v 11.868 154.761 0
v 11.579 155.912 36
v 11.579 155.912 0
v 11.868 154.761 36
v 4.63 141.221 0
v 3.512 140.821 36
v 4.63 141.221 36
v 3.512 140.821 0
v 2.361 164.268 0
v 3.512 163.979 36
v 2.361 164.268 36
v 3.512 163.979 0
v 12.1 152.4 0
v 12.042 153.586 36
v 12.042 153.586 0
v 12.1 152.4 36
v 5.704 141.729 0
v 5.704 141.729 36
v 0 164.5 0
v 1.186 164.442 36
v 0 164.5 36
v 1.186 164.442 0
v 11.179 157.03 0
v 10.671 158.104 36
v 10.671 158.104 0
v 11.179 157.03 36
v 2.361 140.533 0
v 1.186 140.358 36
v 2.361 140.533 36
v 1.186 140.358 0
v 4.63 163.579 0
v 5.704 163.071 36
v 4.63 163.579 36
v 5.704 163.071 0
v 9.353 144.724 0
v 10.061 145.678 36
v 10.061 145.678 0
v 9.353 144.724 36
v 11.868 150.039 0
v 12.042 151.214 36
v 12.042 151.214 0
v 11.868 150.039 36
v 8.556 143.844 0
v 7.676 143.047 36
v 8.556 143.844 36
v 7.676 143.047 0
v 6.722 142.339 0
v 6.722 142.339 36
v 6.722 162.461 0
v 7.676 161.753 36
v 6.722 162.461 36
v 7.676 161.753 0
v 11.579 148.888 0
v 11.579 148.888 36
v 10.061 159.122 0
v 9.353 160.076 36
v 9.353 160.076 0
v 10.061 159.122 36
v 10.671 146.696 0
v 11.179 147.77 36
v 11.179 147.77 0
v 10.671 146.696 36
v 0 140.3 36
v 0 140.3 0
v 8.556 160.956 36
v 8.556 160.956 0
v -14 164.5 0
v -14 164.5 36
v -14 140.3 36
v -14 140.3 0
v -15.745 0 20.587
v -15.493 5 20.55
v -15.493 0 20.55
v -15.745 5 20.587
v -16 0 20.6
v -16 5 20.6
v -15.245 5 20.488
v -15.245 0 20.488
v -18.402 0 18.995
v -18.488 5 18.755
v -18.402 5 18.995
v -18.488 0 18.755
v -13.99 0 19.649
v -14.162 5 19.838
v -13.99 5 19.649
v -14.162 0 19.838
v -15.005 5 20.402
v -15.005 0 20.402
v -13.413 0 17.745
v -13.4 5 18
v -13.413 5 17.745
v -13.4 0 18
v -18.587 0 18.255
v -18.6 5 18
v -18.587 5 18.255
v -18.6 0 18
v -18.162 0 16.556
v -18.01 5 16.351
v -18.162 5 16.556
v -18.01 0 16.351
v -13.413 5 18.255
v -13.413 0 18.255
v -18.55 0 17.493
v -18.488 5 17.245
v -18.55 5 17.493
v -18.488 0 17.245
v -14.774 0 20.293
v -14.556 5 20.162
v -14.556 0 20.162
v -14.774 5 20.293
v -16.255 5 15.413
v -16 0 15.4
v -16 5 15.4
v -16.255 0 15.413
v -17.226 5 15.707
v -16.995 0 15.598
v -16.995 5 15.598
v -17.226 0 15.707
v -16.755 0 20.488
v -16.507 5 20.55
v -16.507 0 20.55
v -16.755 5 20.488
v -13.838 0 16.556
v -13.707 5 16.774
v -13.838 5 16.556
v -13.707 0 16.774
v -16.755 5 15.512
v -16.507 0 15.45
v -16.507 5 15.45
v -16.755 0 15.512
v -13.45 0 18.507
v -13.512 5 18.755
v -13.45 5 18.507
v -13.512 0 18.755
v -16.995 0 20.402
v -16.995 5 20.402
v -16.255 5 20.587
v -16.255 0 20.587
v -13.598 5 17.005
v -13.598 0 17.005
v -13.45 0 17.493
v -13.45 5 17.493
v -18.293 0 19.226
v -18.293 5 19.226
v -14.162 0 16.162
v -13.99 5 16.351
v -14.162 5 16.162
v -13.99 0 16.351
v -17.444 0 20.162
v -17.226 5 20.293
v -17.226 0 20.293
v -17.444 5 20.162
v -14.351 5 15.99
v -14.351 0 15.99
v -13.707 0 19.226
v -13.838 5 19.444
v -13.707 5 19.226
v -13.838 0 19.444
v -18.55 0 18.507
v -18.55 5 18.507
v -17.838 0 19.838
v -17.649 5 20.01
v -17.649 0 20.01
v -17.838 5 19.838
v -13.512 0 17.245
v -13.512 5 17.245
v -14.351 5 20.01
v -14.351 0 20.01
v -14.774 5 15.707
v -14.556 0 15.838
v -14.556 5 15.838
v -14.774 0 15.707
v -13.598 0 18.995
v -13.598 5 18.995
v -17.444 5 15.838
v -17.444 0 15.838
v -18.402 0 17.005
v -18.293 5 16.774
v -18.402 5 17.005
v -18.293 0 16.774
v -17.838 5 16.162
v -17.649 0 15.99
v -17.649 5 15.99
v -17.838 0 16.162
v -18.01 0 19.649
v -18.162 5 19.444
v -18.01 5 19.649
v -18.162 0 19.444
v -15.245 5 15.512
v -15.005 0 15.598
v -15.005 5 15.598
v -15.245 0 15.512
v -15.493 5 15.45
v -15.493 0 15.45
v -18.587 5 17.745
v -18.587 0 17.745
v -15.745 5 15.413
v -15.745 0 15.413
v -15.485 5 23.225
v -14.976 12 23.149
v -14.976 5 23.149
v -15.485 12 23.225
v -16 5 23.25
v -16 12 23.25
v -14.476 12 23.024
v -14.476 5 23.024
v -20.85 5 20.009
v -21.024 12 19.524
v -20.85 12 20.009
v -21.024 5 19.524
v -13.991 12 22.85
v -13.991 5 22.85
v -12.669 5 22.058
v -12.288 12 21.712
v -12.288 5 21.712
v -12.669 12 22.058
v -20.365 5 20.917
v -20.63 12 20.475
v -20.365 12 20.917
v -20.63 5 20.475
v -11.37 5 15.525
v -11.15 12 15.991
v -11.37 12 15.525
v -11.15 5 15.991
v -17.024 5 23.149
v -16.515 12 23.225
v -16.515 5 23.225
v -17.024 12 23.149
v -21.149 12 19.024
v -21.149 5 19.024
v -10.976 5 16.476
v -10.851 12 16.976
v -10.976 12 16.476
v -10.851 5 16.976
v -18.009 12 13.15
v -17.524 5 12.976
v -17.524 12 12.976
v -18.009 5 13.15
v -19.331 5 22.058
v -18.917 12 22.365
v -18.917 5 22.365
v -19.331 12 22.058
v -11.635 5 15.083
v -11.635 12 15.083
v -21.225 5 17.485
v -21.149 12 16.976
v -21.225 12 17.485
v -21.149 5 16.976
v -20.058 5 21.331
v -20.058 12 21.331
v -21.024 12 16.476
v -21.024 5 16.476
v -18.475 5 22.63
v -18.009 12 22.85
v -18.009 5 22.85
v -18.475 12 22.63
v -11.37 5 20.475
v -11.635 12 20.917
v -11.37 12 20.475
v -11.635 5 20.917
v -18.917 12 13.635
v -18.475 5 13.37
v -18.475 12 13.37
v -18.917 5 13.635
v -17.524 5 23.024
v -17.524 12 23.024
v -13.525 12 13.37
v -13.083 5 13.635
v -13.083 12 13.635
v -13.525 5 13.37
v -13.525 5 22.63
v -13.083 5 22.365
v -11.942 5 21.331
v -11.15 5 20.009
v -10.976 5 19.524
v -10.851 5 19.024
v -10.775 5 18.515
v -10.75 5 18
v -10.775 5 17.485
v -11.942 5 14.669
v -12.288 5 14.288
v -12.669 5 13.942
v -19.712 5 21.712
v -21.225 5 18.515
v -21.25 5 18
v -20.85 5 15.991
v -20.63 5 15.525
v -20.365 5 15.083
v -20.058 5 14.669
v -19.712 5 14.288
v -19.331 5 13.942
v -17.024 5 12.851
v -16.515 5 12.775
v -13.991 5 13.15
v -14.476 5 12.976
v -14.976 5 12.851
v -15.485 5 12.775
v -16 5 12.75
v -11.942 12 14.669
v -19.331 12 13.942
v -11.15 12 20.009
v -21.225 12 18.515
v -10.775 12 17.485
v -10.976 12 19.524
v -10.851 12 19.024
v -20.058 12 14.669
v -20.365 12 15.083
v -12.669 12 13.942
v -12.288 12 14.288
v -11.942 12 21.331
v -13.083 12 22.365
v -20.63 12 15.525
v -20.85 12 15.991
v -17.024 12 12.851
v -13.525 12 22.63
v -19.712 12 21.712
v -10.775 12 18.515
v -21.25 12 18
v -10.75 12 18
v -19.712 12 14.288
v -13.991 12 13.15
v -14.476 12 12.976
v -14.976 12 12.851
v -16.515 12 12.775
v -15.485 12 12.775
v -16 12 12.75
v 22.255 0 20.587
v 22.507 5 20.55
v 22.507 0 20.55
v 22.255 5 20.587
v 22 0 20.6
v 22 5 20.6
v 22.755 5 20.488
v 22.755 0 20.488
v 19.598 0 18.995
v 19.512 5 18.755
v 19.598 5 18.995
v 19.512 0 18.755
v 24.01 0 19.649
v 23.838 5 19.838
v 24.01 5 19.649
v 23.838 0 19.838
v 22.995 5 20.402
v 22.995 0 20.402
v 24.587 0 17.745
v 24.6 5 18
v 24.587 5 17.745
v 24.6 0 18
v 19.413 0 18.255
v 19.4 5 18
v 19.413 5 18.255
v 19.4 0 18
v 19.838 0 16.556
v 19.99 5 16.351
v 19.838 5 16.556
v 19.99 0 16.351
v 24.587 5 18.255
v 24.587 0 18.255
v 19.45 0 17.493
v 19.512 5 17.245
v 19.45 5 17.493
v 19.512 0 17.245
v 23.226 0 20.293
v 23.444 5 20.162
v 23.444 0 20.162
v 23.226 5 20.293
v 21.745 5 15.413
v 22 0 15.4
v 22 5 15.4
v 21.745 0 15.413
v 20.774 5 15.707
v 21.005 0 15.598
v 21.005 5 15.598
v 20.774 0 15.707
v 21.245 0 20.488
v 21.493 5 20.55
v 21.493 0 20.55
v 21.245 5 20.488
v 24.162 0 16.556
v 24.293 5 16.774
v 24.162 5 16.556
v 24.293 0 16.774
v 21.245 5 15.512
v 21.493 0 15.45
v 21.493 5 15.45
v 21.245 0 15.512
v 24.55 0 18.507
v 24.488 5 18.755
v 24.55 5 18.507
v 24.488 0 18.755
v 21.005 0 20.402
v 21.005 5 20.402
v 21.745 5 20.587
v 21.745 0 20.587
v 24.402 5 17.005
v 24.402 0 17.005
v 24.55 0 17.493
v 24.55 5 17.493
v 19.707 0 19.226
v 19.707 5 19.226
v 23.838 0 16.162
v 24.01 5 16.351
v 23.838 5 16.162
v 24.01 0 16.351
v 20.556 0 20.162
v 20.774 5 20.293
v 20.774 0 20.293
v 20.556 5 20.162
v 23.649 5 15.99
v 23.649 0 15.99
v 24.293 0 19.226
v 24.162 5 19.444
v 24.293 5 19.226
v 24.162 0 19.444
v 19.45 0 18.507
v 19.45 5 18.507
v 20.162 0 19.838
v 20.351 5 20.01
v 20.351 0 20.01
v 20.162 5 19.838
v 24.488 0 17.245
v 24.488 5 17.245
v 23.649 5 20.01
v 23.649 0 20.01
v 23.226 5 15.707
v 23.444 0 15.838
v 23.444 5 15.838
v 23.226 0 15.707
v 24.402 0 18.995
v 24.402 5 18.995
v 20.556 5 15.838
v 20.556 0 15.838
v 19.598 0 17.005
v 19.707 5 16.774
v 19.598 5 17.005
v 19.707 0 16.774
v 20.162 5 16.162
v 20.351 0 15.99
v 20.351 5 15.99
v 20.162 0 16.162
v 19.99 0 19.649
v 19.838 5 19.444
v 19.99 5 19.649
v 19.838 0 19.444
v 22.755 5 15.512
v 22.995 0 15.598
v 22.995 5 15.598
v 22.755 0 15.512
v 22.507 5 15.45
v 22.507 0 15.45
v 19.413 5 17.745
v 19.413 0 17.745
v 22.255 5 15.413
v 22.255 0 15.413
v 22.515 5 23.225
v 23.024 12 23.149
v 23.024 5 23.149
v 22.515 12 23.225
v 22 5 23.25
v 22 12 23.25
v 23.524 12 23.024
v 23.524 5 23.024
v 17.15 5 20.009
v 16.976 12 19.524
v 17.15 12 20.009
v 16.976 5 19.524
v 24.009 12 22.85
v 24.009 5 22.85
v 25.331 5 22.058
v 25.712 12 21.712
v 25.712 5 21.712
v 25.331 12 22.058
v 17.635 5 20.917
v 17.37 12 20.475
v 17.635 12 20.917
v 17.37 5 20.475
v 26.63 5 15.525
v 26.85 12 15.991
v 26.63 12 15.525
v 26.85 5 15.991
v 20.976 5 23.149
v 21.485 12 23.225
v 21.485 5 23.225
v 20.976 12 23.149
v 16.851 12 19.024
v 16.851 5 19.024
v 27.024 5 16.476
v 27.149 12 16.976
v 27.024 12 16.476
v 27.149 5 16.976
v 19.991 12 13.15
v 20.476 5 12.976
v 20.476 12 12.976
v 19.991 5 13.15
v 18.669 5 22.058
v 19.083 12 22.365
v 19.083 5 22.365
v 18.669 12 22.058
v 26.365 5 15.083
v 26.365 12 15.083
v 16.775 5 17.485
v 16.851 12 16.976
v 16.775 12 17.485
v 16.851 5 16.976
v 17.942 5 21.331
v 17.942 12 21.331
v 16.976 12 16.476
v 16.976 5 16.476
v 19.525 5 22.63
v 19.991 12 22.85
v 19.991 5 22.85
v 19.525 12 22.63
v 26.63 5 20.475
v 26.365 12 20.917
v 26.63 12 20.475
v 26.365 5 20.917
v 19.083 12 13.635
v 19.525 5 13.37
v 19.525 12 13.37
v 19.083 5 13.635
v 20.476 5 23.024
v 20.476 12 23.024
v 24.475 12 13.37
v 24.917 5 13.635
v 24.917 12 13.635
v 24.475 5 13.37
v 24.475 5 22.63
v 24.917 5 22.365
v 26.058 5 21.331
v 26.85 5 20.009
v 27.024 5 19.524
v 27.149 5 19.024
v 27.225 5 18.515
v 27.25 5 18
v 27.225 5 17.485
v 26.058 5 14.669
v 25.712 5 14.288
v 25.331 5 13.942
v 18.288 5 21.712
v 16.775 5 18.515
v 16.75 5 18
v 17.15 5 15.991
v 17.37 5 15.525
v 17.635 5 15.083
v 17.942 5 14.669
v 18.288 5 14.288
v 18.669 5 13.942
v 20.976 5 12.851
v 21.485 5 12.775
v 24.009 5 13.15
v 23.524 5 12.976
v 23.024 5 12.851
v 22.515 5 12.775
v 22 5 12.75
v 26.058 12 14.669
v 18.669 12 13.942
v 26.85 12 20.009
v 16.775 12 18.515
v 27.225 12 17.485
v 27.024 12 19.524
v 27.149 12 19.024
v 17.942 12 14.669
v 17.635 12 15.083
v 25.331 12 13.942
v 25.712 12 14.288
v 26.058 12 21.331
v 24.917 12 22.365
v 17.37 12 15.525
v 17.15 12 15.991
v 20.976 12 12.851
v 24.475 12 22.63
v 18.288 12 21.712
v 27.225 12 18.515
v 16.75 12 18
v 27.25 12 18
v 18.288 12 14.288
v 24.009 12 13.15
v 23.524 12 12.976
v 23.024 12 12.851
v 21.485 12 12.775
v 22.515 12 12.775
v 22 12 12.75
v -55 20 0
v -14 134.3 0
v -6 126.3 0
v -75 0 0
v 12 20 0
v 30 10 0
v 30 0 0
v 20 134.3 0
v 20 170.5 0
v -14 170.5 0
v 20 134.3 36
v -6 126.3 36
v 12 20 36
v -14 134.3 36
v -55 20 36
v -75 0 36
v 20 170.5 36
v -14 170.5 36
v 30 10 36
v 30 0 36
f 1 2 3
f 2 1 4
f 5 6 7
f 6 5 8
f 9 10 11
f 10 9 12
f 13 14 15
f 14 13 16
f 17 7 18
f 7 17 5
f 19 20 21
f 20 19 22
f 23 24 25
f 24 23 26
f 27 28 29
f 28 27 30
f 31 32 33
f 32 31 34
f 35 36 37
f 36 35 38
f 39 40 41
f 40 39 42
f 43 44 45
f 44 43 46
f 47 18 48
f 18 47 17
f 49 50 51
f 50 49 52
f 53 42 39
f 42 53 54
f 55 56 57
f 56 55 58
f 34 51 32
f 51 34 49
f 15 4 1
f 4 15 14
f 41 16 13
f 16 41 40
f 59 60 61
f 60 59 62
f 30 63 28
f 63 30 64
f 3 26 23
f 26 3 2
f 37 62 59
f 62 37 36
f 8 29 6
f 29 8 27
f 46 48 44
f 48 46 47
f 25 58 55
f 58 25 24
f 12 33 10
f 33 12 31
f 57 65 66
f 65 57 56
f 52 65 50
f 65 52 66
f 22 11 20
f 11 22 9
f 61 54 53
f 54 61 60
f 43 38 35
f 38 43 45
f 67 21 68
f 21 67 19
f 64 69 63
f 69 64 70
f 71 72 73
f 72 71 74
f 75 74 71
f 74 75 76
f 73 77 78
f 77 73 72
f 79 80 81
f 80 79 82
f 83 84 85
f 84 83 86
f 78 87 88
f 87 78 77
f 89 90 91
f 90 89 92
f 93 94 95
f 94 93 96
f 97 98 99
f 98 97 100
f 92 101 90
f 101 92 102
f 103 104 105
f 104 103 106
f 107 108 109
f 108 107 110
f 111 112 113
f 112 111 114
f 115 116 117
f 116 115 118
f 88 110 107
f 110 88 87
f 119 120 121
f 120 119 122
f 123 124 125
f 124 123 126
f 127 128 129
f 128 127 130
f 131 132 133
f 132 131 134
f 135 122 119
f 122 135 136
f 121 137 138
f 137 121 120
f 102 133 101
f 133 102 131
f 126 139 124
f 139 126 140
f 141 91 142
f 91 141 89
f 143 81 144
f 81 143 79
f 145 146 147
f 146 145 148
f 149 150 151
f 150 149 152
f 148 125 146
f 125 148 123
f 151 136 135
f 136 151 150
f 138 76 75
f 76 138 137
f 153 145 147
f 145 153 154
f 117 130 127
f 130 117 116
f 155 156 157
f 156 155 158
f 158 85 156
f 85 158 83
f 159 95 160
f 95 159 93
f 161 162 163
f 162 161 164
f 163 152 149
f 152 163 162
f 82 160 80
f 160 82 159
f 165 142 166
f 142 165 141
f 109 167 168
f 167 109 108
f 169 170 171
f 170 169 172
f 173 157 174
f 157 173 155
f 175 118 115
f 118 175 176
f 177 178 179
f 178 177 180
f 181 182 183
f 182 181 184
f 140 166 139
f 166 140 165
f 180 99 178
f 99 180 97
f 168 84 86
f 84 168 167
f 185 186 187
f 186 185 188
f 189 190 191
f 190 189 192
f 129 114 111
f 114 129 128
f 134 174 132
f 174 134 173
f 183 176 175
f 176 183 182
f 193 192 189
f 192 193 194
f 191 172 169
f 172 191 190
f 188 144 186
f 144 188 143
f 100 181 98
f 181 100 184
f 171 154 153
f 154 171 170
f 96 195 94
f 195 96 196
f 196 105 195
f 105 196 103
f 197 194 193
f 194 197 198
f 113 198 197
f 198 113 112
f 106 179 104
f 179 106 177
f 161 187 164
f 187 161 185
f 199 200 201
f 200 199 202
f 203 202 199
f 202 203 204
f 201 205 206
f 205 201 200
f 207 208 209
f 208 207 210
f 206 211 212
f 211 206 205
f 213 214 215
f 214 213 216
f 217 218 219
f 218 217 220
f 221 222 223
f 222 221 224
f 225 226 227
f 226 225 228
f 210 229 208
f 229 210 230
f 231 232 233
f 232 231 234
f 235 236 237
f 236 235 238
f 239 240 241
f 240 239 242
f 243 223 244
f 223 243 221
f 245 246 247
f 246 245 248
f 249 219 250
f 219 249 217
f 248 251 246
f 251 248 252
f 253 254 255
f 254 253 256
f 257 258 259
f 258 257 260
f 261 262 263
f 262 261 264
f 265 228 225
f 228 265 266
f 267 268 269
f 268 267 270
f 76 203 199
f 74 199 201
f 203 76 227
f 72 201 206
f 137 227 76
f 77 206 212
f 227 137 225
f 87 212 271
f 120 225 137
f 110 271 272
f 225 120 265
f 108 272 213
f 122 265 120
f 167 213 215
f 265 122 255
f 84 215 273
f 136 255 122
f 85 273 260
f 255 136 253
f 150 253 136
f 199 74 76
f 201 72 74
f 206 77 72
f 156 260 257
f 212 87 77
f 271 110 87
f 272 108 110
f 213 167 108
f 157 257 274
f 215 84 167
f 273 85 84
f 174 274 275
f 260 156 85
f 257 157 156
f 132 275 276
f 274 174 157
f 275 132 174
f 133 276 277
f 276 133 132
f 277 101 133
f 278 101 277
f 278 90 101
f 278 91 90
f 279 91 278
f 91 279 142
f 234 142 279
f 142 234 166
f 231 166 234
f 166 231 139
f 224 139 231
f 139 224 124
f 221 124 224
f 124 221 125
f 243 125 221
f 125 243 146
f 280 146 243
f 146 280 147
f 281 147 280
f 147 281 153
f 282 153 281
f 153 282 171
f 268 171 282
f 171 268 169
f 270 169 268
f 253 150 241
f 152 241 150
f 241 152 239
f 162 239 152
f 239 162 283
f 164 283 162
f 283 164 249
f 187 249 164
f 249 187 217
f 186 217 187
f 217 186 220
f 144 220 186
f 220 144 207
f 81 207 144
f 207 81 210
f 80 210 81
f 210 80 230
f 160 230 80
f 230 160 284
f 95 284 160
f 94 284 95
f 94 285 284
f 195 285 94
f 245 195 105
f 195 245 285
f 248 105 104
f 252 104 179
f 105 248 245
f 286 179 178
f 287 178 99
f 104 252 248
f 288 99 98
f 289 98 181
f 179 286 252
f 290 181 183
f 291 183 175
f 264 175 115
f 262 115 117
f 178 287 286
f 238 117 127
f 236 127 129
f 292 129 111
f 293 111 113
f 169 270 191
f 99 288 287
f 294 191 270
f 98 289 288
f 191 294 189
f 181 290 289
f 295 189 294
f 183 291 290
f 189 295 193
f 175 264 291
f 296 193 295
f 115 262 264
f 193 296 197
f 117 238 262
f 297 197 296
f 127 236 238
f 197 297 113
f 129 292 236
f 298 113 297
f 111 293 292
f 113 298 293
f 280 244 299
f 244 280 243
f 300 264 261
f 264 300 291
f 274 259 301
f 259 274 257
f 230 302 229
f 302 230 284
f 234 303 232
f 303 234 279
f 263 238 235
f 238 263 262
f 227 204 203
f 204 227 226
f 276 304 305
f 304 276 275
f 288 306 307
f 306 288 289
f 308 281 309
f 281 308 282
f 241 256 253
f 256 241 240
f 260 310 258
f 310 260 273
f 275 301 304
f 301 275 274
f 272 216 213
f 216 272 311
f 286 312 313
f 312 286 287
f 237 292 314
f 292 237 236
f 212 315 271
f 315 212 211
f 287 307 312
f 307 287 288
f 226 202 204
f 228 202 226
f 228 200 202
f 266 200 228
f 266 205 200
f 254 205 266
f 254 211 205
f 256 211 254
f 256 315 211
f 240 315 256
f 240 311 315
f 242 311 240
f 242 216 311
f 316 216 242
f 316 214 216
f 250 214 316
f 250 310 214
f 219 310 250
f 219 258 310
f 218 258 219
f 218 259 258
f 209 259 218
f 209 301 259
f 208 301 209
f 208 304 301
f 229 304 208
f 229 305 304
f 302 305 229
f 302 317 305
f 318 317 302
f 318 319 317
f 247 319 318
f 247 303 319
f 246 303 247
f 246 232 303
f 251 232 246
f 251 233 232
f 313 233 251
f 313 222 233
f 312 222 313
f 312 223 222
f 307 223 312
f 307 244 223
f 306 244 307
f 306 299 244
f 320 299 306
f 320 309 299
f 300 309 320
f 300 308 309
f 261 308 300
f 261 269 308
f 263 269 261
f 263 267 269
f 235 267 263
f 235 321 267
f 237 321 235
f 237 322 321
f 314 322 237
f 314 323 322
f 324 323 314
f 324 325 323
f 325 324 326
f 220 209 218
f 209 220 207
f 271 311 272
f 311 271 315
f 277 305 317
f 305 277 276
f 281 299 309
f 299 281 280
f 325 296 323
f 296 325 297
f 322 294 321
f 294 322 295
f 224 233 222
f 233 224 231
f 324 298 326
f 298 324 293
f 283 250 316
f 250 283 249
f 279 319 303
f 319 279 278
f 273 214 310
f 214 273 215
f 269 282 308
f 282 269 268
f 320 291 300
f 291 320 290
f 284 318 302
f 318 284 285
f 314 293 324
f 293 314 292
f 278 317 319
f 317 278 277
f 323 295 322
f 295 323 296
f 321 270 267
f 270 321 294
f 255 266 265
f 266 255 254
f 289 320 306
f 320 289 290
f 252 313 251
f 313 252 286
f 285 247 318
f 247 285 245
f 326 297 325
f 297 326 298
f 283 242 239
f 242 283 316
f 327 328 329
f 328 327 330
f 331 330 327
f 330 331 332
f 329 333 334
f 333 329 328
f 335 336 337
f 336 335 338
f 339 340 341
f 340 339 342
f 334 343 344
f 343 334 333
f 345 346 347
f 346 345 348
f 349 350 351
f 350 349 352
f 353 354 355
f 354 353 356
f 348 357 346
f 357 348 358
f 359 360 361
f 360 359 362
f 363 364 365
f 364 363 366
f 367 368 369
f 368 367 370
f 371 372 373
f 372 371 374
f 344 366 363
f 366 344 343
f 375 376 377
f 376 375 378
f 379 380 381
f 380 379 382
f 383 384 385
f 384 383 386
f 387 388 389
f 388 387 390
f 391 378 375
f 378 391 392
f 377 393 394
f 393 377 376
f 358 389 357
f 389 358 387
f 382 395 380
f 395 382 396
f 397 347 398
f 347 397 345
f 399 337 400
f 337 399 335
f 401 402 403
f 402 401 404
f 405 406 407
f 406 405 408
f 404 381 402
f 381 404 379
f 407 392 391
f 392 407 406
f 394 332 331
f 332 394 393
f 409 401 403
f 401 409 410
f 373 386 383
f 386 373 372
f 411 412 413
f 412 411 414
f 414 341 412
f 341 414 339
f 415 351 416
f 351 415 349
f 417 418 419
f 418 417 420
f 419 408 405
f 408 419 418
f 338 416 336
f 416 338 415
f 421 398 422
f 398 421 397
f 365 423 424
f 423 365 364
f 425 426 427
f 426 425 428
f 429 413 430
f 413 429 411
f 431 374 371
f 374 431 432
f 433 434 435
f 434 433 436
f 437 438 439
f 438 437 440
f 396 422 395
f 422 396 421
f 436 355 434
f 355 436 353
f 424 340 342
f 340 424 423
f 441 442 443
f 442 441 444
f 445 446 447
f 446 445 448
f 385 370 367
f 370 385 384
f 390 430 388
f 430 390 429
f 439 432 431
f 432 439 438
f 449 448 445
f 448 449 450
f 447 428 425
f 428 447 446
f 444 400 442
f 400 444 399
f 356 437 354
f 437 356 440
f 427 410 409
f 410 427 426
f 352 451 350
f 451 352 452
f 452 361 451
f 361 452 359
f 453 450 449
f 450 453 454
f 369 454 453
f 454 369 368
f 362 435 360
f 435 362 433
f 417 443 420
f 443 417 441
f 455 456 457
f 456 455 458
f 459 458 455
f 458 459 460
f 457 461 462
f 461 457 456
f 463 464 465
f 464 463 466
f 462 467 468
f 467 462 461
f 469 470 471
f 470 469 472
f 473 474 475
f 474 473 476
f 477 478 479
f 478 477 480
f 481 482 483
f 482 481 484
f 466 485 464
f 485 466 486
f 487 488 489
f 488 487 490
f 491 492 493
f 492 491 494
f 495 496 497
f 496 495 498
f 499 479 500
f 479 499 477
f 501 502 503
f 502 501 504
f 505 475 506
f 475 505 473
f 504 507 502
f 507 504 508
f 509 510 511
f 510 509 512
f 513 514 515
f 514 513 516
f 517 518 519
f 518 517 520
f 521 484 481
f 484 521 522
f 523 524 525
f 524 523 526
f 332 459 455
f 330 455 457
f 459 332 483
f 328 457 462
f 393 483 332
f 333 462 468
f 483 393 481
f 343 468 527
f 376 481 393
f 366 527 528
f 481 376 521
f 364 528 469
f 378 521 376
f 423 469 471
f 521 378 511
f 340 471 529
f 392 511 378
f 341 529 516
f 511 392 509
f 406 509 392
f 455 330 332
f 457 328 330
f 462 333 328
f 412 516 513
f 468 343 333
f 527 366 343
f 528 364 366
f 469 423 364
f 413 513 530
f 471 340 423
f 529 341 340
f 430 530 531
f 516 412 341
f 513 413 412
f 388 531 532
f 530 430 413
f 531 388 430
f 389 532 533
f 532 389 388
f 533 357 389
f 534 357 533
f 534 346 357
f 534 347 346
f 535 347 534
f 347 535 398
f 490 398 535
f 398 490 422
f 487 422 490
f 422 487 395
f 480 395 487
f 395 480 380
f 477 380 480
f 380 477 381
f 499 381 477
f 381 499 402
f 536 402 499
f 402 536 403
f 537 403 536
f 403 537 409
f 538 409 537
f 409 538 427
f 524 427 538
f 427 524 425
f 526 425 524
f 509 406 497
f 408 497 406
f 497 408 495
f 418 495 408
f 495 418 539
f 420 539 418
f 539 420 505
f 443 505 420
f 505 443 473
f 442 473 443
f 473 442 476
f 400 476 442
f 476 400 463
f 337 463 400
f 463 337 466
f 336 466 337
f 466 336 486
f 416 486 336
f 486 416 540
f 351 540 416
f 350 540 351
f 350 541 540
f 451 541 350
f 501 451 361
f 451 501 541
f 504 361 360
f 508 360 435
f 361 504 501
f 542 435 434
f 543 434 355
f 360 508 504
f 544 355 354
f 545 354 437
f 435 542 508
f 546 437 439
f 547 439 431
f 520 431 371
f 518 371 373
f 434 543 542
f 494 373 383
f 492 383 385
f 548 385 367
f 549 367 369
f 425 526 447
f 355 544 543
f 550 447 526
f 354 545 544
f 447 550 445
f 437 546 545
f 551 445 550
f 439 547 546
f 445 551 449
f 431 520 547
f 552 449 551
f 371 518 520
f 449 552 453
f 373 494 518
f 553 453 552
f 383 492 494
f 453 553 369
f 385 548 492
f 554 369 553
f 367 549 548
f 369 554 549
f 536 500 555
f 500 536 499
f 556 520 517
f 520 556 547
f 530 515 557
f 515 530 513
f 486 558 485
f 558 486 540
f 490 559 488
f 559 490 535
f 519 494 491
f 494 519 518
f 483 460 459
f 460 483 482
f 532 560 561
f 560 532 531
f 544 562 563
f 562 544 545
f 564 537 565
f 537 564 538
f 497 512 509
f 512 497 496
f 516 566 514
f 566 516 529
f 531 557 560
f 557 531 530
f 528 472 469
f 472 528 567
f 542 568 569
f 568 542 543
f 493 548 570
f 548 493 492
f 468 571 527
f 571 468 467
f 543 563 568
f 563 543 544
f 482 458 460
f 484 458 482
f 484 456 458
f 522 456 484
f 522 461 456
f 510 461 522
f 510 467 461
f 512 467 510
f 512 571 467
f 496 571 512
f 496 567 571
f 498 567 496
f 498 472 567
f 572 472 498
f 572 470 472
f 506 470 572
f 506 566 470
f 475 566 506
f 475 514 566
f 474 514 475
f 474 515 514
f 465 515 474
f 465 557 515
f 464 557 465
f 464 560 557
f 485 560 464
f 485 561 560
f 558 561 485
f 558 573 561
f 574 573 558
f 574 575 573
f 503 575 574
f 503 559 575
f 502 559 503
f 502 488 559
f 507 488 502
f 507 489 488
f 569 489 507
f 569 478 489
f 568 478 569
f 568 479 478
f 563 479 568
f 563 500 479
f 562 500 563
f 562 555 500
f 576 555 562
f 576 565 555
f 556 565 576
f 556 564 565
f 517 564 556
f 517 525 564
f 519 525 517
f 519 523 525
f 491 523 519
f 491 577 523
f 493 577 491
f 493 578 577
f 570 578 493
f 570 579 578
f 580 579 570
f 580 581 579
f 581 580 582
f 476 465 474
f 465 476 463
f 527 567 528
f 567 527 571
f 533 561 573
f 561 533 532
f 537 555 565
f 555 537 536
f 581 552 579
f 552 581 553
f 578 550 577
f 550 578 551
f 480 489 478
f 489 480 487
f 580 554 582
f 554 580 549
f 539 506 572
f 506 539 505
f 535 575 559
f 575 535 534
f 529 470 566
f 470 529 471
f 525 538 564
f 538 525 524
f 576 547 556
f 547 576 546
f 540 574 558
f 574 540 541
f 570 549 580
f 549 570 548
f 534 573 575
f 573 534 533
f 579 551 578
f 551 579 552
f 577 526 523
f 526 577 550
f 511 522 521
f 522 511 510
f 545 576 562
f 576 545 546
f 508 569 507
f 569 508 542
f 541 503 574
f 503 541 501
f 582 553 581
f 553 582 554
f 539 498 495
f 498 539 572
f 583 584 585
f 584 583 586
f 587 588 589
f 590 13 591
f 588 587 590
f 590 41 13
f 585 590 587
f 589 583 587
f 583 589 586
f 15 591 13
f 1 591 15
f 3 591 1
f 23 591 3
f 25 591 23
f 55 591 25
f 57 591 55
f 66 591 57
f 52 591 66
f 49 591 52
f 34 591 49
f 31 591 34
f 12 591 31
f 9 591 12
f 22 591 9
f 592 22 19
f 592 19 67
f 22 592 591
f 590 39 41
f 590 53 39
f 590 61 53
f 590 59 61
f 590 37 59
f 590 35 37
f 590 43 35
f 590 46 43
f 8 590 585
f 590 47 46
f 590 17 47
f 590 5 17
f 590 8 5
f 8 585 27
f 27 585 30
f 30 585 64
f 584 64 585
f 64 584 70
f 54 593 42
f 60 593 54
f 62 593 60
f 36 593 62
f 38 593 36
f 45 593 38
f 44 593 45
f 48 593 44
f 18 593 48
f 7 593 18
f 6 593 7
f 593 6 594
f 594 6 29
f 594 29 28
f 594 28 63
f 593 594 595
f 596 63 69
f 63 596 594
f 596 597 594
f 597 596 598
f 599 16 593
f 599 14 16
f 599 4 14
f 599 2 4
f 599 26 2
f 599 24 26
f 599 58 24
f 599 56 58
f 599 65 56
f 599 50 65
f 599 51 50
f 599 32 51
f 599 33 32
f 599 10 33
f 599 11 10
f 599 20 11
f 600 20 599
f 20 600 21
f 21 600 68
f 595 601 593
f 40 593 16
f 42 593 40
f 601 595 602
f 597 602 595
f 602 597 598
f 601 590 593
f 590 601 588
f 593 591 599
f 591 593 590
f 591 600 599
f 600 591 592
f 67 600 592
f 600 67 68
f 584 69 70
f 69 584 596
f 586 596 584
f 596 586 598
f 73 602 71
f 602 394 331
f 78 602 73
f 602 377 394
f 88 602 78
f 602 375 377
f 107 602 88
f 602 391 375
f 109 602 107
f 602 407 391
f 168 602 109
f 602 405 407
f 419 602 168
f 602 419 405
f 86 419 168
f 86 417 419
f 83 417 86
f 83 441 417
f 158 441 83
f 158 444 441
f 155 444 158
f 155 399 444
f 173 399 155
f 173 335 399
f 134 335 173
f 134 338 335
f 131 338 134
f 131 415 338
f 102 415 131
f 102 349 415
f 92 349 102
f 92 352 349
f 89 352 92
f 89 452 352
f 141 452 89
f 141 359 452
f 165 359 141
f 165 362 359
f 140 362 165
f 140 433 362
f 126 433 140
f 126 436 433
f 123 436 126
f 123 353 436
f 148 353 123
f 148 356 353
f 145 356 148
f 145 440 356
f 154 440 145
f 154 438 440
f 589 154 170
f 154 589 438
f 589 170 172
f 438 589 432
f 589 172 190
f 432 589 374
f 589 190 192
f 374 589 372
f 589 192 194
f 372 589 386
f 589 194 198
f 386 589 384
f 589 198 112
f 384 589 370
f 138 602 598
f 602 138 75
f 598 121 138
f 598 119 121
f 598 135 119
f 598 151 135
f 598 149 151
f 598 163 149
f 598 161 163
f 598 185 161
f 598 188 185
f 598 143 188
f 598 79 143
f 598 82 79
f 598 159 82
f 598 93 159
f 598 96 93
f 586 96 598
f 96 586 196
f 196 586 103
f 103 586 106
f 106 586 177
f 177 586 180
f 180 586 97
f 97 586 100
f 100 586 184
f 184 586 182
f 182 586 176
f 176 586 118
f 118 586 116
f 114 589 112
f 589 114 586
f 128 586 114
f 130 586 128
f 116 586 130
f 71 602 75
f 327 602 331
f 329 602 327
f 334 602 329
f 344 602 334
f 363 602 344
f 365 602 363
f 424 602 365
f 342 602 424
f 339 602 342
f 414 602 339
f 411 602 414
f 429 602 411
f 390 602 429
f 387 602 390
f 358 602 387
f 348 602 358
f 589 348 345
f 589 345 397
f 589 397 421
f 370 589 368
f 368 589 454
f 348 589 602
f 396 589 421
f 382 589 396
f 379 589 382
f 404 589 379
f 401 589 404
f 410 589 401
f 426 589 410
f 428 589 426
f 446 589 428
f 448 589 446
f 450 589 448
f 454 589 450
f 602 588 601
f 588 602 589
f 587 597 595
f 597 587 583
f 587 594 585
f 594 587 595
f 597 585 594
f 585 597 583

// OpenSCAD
// ==============================================================================
// 8ft Maker Station: Parametric 3D Printable Spool Bracket & Stopper Collar
// Parametric OpenSCAD Model for Modular 3/4" EMT Steel Conduit
// ==============================================================================
//
// Mounting: Designed for 2x4 posts oriented short-ways (3.5" wide front face).
// Support-Free DFM: Lay flat on side (print_orientation = "print") for 100%
// support-free printing and optimal tensile layer orientation.
//
// ==============================================================================

/* [Component Selection] */
// Select which part to preview / export
part_type = "center"; // [center: Center Pass-Through Bracket, end_left: Left End Bracket, end_right: Right End Bracket, collar: Conduit Stopper Collar, all: Complete Set]

// Orientation for 3D slicing vs workbench modeling
orientation = "print"; // [print: Laid flat on side for support-free printing, model: Upright as installed on workbench post]

/* [Conduit & Rod Specifications] */
// 3/4" EMT steel conduit nominal outer diameter (mm)
conduit_od = 23.42;

// Diametral clearance for smooth slip-fit (mm)
conduit_clearance = 0.78;

// Cantilever projection from post face to rod center (mm, 152.4mm = 6.0 inches)
cantilever_length = 152.4;

/* [Structural Bracket Dimensions] */
// Uniform bracket body width (mm) - sets print bed width when printed on side
bracket_width = 36.0;

// Base mounting flange thickness against 2x4 wood face (mm)
flange_thickness = 10.0;

// Upper mounting tab height above conduit center (mm)
mount_z_top = 30.0;

// Lower gusset anchor depth below conduit center (mm, total span 105mm)
mount_z_bot = -75.0;

// Solid wall thickness surrounding conduit bore (mm)
cradle_wall_thick = 6.0;

// Cradle top mouth height (mm)
cradle_head_top_z = 20.0;

// Cradle bottom reinforcement elevation (mm)
cradle_head_bot_z = -14.0;

// Include weight-saving / I-beam truss pocket
with_truss_pocket = true;

/* [Fasteners & Retaining Pin] */
// Wood screw clearance hole diameter (mm, #9/#10 / M5)
screw_hole_dia = 5.2;

// Screw counterbore diameter (mm)
screw_cbore_dia = 10.5;

// Screw counterbore depth (mm)
screw_cbore_depth = 5.0;

// Transverse retaining cross-bolt / linchpin hole diameter (mm)
pin_hole_dia = 5.2;

/* [Conduit Stopper Collar] */
collar_width = 16.0;
collar_od = 36.0;
collar_bolt_dia = 4.3; // M4 screw

/* [Rendering Precision] */
$fn = 64;

// ==============================================================================
// COMPUTED PARAMETERS
// ==============================================================================
conduit_r = (conduit_od + conduit_clearance) / 2.0; // 12.10 mm
cradle_y_min = cantilever_length - conduit_r - cradle_wall_thick;
cradle_y_max = cantilever_length + conduit_r + cradle_wall_thick;

// ==============================================================================
// MODULES
// ==============================================================================

module spool_bracket(type = "center") {
    difference() {
        // 1. Solid Extruded Profile
        translate([-bracket_width / 2, 0, 0])
            rotate([0, 90, 0])
            linear_extrude(height = bracket_width)
            polygon(points = [
                [z_bot_actual(), 0],
                [cradle_head_bot_z, cradle_y_min],
                [cradle_head_bot_z, cradle_y_max],
                [cradle_head_top_z, cradle_y_max],
                [cradle_head_top_z, cradle_y_min],
                [mount_z_top, flange_thickness],
                [mount_z_top, 0],
                [z_bot_actual(), 0]
            ]);

        // 2. Truss Weight-Saving Pocket
        if (with_truss_pocket) {
            translate([-bracket_width / 2 - 1, 0, 0])
                rotate([0, 90, 0])
                linear_extrude(height = bracket_width + 2)
                polygon(points = [
                    [z_bot_actual() + 20.0, flange_thickness + 10.0],
                    [cradle_head_bot_z + 8.0, cradle_y_min - 8.0],
                    [mount_z_top - 18.0, flange_thickness + 10.0]
                ]);
        }

        // 3. Conduit U-Channel Cradle Cutout
        cut_x_start = (type == "end_left") ? (-bracket_width / 2 + 4.0) : (-bracket_width / 2 - 2);
        cut_len = (type == "end_left" || type == "end_right") ? (bracket_width - 4.0 + 2.0) : (bracket_width + 4.0);

        translate([cut_x_start, cantilever_length, 0]) {
            // Circular bottom cradle
            rotate([0, 90, 0])
                cylinder(r = conduit_r, h = cut_len);

            // Upright vertical slot
            translate([0, -conduit_r, 0])
                cube([cut_len, 2 * conduit_r, cradle_head_top_z + 5]);

            // Flared lead-in chamfers at top opening
            translate([0, -conduit_r, cradle_head_top_z])
                rotate([45, 0, 0])
                cube([cut_len, 4, 4]);

            translate([0, conduit_r, cradle_head_top_z])
                rotate([45, 0, 0])
                cube([cut_len, 4, 4]);
        }

        // 4. Centerline Countersunk Mounting Screw Holes
        screw_z_positions = [16.0, -22.0, -60.0];
        for (hz = screw_z_positions) {
            translate([0, -1, hz]) {
                rotate([-90, 0, 0]) {
                    cylinder(d = screw_hole_dia, h = flange_thickness + 2);
                    translate([0, 0, flange_thickness - screw_cbore_depth + 1])
                        cylinder(d = screw_cbore_dia, h = screw_cbore_depth + 2);
                }
            }
        }

        // 5. Transverse Retaining Pin / Linchpin Hole
        translate([-bracket_width / 2 - 2, cantilever_length, 14.0])
            rotate([0, 90, 0])
            cylinder(d = pin_hole_dia, h = bracket_width + 4);
    }
}

function z_bot_actual() = mount_z_bot;

module stopper_collar() {
    r_in = (conduit_od + conduit_clearance) / 2.0;
    r_out = collar_od / 2.0;
    ear_w = 14.0;
    ear_len = 16.0;

    difference() {
        union() {
            cylinder(r = r_out, h = collar_width);
            translate([-ear_w / 2, r_out - 4.0, 0])
                cube([ear_w, ear_len, collar_width]);
        }

        // Central conduit bore
        translate([0, 0, -1])
            cylinder(r = r_in, h = collar_width + 2);

        // Clamping slit
        translate([-1.0, 0, -1])
            cube([2.0, ear_len + r_out, collar_width + 2]);

        // M4 Clamping bolt hole & counterbores
        translate([-ear_w / 2 - 2, r_out + 6.0, collar_width / 2])
            rotate([0, 90, 0]) {
                cylinder(d = collar_bolt_dia, h = ear_w + 4);
                // Bolt head pocket
                cylinder(d = 8.0, h = 4.0);
                // Nut trap pocket
                translate([0, 0, ear_w])
                    cylinder(d = 8.5, h = 4.0, $fn = 6);
            }
    }
}

// ==============================================================================
// DISPATCH / DISPLAY LOGIC
// ==============================================================================

module orient_bracket(type) {
    if (orientation == "print") {
        // Lay flat on side: X becomes Z (zero supports required)
        rotate([0, -90, 0])
            translate([bracket_width / 2, 0, 0])
            spool_bracket(type);
    } else {
        // Model orientation: upright mounted against post
        spool_bracket(type);
    }
}

if (part_type == "center") {
    color([0.2, 0.5, 0.8]) orient_bracket("center");
} else if (part_type == "end_left") {
    color([0.3, 0.7, 0.4]) orient_bracket("end_left");
} else if (part_type == "end_right") {
    color([0.3, 0.7, 0.4]) orient_bracket("end_right");
} else if (part_type == "collar") {
    color([0.8, 0.5, 0.2]) stopper_collar();
} else if (part_type == "all") {
    translate([-100, 0, 0]) color([0.3, 0.7, 0.4]) orient_bracket("end_left");
    translate([0, 0, 0])    color([0.2, 0.5, 0.8]) orient_bracket("center");
    translate([100, 0, 0])  color([0.3, 0.7, 0.4]) orient_bracket("end_right");
    translate([0, 200, 0])  color([0.8, 0.5, 0.2]) stopper_collar();
}
